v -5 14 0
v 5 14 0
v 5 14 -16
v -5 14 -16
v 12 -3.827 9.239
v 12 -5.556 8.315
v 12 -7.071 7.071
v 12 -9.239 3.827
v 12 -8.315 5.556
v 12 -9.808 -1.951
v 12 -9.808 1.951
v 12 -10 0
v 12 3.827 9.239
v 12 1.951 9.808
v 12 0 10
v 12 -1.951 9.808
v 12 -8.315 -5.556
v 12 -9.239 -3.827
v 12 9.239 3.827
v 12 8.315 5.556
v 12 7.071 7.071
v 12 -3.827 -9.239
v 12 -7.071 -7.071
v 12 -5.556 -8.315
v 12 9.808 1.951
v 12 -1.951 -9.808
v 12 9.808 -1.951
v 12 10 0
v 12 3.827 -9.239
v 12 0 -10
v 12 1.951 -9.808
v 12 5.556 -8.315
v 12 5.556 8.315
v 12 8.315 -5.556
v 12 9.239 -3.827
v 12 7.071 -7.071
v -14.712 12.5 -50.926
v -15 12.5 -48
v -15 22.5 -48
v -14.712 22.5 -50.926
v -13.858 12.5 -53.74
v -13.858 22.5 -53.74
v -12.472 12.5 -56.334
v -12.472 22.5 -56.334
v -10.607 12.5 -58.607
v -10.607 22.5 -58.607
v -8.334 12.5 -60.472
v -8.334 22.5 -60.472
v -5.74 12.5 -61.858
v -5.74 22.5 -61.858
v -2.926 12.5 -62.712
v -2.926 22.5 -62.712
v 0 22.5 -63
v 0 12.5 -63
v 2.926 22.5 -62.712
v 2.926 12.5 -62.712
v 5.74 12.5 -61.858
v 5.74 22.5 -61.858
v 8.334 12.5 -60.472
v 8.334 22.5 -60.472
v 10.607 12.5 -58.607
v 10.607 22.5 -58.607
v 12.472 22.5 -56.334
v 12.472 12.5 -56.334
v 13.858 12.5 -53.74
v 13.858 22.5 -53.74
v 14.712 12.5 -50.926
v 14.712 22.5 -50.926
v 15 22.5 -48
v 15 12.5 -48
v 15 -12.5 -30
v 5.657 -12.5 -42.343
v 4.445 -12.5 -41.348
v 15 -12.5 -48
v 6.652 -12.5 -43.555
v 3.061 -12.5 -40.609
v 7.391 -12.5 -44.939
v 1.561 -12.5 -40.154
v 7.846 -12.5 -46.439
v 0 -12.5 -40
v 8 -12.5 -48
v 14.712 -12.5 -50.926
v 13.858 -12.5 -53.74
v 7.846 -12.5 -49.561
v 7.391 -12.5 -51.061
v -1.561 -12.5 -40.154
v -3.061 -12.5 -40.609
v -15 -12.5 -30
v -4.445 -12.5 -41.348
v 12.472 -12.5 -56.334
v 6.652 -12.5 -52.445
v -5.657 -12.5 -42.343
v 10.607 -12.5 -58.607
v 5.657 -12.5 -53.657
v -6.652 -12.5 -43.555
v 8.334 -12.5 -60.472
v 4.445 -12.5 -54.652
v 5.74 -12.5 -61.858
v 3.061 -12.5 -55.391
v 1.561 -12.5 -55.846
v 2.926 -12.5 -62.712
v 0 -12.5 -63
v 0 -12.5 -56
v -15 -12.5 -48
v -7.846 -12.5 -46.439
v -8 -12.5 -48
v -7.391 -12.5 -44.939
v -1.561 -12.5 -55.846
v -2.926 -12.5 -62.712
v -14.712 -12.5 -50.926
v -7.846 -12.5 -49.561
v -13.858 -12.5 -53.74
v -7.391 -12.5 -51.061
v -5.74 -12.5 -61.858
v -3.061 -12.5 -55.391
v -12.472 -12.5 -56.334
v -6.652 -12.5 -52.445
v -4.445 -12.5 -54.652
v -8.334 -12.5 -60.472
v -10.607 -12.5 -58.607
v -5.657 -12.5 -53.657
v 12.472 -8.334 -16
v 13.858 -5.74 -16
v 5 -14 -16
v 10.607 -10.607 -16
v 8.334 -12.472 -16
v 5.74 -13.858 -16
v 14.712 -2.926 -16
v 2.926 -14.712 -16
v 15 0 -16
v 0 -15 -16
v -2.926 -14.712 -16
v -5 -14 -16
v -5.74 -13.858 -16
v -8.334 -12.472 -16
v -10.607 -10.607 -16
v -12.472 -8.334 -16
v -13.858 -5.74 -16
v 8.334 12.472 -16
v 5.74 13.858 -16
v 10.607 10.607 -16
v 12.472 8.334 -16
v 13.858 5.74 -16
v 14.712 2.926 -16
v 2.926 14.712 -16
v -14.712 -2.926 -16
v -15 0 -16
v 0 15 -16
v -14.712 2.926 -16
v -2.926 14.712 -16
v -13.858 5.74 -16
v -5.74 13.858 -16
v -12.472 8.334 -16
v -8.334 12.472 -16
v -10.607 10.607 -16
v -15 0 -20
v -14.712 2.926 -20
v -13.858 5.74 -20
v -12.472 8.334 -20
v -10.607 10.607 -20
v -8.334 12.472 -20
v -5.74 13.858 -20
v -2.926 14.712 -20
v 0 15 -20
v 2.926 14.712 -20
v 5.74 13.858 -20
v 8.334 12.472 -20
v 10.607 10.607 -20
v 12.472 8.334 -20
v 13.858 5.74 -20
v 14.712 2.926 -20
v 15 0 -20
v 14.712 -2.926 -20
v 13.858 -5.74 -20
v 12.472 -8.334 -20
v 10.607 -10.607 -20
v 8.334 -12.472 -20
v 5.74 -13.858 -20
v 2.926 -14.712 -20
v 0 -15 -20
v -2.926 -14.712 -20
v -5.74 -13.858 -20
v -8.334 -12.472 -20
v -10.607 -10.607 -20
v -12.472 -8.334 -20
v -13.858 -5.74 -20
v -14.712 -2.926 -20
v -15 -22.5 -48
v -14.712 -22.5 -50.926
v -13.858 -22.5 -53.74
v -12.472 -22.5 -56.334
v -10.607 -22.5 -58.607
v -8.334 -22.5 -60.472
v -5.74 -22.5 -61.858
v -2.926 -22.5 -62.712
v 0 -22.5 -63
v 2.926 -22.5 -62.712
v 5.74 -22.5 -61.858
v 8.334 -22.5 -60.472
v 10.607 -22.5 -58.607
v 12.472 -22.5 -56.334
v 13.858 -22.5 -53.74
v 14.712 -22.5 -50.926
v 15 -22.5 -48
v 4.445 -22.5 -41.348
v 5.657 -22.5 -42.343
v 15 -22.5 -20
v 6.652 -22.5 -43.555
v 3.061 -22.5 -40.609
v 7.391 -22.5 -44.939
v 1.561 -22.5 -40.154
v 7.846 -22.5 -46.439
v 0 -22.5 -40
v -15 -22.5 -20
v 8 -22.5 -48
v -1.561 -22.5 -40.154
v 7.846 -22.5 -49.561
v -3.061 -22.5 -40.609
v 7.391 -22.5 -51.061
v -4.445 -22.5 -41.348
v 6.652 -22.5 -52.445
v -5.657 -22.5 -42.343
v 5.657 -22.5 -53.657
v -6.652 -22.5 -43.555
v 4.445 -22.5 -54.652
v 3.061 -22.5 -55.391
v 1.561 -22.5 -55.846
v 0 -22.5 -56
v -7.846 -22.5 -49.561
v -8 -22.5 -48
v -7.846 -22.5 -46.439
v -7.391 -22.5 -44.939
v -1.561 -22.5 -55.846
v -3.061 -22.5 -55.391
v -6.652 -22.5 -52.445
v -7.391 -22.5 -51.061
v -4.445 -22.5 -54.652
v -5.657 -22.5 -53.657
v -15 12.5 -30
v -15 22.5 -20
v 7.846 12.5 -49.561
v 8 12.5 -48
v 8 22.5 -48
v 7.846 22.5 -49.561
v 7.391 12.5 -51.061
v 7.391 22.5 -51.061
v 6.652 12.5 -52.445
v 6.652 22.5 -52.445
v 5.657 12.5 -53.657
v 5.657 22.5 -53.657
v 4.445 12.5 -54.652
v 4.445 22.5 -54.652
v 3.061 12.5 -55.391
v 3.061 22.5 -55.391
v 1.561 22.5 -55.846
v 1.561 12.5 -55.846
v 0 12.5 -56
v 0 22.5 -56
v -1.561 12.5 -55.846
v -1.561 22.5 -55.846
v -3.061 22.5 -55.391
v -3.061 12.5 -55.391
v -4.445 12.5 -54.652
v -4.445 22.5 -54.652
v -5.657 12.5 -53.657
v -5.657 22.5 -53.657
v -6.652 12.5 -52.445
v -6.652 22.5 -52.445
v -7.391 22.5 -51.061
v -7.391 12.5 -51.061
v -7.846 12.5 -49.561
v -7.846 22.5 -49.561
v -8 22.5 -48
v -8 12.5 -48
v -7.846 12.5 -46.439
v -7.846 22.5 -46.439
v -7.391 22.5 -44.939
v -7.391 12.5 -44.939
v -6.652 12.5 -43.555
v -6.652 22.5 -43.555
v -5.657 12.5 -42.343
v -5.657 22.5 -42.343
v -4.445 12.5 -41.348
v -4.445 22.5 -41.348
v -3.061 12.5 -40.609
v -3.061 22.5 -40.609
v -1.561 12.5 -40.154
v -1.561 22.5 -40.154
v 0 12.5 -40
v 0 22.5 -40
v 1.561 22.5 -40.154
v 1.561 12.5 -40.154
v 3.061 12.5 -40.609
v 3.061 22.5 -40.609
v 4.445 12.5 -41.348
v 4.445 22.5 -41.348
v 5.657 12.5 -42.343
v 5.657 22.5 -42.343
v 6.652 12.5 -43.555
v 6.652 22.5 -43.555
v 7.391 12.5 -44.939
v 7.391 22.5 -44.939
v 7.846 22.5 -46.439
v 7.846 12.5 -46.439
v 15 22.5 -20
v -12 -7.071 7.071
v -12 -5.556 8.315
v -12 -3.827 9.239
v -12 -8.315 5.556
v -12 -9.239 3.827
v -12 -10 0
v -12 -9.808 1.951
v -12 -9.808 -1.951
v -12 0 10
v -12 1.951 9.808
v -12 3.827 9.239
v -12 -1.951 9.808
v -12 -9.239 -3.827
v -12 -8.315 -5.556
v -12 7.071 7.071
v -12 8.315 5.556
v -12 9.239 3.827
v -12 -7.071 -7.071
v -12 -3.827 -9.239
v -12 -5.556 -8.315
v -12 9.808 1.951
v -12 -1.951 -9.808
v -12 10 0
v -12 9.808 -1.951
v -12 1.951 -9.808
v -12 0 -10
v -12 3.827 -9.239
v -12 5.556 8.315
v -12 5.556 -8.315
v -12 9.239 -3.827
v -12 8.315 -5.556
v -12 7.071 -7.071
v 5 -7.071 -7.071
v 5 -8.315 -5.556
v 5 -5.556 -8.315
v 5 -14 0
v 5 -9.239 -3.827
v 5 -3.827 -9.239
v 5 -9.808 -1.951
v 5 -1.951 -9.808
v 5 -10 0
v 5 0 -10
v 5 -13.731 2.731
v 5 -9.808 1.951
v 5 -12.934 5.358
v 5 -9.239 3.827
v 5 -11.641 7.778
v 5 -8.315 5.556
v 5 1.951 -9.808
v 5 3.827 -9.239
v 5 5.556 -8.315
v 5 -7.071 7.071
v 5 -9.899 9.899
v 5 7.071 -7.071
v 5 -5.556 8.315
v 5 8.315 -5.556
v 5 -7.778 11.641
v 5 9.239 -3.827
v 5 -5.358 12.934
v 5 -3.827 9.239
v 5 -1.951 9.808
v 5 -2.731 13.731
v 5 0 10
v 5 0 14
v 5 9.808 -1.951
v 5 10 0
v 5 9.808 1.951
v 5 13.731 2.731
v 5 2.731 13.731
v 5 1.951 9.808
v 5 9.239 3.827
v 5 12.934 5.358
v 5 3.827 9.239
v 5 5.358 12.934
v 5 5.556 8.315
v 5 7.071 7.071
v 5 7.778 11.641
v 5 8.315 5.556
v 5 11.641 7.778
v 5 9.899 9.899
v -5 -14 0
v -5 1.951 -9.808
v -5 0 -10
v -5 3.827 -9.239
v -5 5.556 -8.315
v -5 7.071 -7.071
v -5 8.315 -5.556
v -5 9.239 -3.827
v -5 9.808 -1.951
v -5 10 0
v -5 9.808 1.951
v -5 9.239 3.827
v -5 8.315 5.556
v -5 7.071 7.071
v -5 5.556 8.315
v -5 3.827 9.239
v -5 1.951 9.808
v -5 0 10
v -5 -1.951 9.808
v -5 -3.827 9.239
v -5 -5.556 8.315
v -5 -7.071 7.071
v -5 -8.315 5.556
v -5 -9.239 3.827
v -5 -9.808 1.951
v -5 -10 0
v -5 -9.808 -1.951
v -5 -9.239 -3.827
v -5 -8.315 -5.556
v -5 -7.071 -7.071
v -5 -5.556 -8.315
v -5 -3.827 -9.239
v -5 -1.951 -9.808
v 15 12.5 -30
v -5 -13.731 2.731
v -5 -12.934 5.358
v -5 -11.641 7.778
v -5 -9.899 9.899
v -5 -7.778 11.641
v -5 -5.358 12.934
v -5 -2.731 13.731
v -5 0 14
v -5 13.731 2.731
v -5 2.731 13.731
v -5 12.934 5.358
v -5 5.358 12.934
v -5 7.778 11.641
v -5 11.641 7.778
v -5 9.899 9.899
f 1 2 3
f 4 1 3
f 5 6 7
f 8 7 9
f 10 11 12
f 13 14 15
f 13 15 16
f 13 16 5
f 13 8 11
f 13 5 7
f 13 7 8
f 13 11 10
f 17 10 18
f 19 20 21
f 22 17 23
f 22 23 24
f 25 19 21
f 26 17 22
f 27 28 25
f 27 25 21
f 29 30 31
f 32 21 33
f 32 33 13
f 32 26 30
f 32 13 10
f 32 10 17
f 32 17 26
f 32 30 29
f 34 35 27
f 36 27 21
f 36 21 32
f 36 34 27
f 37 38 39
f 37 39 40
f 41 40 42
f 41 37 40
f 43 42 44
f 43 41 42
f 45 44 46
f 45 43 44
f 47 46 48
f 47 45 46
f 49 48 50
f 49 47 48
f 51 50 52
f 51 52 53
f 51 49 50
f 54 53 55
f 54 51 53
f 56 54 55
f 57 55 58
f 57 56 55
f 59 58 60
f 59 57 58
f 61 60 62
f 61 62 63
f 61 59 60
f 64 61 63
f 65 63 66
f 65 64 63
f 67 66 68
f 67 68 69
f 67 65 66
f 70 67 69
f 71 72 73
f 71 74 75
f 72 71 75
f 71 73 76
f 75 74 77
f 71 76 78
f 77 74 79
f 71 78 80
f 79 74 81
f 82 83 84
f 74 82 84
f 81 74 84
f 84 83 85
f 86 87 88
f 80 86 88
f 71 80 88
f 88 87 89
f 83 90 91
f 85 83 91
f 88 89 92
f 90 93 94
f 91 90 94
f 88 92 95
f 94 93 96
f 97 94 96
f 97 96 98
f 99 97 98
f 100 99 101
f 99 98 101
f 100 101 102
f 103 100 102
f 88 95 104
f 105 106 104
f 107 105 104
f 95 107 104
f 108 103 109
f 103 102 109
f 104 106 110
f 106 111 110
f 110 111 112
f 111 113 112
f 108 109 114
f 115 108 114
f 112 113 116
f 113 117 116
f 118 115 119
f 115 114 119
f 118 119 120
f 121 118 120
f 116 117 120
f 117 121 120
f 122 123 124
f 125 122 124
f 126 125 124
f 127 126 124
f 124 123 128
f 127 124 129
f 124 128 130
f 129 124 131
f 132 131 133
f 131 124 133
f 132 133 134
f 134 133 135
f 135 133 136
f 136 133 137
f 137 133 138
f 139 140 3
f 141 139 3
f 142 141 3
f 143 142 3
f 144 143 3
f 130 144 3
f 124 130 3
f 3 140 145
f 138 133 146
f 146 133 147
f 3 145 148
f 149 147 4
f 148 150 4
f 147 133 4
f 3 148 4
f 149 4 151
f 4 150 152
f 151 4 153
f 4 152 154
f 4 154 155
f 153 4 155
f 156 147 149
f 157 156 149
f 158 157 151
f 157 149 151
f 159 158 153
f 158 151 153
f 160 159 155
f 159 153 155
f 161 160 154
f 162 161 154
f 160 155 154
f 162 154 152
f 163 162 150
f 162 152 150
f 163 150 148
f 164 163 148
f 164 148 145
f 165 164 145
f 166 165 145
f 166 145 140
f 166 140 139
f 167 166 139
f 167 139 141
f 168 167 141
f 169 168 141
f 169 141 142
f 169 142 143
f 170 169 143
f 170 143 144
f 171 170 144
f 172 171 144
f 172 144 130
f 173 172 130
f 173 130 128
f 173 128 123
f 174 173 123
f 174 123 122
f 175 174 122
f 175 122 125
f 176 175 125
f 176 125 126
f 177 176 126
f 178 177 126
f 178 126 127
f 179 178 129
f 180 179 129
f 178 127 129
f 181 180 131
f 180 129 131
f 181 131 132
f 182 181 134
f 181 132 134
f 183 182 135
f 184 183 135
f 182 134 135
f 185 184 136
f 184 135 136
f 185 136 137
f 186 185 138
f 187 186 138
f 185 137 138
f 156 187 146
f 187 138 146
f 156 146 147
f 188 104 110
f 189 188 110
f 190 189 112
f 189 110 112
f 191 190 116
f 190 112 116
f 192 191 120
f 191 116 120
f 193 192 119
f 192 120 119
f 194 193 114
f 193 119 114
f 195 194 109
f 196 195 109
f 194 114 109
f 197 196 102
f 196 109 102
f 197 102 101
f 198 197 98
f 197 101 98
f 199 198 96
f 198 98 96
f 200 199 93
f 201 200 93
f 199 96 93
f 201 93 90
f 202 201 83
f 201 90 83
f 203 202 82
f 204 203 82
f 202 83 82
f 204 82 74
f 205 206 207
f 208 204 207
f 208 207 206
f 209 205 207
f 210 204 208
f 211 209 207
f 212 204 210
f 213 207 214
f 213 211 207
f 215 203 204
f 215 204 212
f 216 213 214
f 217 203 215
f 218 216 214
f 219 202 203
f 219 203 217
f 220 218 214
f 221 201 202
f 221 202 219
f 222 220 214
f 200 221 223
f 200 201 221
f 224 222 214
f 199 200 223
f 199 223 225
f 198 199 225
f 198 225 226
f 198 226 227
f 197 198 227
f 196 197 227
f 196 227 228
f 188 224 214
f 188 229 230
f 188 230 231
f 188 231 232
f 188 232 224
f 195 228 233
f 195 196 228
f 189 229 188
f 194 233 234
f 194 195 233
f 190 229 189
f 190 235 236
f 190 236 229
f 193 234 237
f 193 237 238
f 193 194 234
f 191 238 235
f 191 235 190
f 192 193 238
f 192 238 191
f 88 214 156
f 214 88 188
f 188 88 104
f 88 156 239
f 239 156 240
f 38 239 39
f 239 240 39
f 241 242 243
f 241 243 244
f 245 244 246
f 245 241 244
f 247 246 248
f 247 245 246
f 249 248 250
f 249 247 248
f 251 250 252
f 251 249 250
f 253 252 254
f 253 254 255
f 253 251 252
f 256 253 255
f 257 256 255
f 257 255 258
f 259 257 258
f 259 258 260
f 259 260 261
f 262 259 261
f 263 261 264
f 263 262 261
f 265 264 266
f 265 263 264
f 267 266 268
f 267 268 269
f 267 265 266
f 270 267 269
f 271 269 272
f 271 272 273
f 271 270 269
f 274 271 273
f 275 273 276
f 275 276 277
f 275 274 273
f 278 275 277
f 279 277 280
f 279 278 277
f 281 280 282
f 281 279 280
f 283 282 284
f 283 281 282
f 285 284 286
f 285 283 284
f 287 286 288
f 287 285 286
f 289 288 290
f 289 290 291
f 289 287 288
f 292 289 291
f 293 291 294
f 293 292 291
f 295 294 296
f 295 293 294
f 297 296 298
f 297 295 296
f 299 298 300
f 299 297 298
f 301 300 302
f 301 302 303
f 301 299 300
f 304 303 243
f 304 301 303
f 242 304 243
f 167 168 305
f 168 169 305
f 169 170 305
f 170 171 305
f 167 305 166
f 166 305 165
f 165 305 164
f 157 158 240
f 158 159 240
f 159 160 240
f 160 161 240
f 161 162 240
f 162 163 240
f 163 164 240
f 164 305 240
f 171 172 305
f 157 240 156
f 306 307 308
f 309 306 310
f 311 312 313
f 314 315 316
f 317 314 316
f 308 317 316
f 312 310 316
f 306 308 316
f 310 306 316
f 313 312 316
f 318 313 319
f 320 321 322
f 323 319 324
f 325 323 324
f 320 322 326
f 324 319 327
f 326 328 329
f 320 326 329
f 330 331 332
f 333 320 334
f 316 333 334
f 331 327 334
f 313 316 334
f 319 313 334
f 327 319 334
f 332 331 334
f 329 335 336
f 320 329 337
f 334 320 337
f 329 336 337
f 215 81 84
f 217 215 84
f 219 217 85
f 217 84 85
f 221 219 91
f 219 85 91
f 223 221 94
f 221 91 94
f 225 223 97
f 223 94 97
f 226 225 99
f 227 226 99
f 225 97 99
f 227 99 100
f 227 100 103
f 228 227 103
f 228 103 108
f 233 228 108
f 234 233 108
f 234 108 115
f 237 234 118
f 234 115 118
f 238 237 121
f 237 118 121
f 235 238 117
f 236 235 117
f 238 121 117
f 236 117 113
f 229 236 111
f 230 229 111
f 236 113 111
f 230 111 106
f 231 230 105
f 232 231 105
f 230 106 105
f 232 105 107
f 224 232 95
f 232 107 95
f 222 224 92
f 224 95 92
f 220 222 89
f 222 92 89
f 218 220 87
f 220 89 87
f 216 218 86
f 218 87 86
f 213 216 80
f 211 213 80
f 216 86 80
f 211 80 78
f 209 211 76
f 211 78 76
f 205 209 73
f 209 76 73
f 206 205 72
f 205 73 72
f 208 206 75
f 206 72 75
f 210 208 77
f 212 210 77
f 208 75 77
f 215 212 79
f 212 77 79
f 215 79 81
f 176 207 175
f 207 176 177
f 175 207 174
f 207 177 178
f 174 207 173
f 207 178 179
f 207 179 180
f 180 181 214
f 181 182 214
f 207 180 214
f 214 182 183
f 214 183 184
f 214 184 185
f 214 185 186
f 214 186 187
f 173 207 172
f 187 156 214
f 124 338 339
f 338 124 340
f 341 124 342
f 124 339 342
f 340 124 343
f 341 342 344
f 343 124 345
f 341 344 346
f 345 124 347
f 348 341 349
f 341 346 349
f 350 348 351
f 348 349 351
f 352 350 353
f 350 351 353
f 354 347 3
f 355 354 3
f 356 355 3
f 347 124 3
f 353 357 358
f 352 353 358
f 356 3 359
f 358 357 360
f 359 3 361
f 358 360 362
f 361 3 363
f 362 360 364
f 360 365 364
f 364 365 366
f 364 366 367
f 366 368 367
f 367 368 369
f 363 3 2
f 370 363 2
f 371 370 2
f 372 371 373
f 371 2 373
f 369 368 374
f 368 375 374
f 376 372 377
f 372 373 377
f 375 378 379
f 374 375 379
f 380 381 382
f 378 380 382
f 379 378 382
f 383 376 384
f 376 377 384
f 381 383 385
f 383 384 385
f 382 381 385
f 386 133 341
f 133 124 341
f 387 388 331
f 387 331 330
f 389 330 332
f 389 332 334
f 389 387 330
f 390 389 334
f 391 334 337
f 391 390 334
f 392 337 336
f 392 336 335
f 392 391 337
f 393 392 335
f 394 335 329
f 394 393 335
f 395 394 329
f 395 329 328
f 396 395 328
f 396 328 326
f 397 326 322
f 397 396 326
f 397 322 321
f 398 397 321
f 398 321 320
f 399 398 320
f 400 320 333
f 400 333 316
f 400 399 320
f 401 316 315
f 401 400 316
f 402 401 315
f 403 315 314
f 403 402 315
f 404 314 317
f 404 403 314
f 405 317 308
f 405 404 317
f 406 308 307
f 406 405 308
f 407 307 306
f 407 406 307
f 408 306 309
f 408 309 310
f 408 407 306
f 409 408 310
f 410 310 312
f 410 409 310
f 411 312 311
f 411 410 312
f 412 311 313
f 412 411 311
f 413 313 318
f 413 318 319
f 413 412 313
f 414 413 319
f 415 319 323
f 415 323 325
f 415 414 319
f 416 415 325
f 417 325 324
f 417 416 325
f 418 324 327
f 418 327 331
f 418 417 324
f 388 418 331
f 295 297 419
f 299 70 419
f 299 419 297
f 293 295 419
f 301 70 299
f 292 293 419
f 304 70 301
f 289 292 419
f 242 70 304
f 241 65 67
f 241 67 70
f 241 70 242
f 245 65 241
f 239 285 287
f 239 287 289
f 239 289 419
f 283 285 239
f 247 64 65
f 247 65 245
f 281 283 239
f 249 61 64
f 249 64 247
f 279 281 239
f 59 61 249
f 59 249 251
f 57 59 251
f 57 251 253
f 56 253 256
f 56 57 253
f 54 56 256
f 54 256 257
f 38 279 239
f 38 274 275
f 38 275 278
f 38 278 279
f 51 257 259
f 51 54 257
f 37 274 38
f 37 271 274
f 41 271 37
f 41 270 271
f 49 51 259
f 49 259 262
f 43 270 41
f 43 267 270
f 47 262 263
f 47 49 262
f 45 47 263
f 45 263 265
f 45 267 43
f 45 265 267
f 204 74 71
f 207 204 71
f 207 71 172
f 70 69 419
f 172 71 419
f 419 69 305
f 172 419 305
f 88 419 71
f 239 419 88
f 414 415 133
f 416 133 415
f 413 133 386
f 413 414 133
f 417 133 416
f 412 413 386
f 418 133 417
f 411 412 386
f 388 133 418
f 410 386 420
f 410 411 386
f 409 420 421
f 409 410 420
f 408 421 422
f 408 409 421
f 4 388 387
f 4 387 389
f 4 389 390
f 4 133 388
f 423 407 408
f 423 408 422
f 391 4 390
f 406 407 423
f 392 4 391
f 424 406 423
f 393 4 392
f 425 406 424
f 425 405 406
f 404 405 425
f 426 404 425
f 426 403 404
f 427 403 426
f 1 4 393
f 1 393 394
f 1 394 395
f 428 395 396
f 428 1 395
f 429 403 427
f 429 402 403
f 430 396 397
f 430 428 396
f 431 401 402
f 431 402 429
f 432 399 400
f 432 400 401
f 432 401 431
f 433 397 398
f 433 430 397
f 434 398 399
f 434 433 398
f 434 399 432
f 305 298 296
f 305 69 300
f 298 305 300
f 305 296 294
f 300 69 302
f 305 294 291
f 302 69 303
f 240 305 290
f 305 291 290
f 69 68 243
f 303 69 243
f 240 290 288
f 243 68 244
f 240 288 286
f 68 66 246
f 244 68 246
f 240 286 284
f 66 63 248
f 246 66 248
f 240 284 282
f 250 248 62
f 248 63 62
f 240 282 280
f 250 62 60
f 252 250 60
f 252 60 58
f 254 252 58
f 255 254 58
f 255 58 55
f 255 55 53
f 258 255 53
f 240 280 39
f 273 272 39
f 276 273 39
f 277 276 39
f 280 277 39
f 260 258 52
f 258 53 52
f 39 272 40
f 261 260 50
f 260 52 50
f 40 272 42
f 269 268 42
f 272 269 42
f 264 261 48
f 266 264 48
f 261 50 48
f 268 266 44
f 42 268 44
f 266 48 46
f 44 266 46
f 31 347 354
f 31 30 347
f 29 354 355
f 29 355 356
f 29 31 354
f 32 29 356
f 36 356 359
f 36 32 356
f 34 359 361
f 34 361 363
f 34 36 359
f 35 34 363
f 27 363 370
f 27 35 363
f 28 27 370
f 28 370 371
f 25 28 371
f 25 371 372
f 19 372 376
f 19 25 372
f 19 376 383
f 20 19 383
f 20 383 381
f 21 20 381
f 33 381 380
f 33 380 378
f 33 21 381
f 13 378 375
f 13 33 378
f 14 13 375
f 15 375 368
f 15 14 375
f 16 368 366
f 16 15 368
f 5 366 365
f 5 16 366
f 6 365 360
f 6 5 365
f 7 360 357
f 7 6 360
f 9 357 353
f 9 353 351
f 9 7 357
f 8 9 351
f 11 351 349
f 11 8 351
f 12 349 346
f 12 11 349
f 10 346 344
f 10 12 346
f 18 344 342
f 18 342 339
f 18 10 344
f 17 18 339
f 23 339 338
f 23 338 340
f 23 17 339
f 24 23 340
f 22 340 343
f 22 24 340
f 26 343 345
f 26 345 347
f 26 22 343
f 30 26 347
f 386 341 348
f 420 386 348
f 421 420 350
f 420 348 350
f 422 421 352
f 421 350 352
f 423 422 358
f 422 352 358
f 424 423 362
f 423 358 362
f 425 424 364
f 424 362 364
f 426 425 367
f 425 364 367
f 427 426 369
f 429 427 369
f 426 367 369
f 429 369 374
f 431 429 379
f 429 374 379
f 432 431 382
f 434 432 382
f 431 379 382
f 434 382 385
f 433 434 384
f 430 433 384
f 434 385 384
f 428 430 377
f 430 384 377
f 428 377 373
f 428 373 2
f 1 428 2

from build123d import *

# Parameters (mm, degrees)
SKETCH1_R           = 10
BOSS_EXTRUDE1_DEPTH = 12
BOSS_EXTRUDE2_DEPTH = 5
SKETCH3_R           = 15
BOSS_EXTRUDE3_DEPTH = 4
SKETCH5_W           = 30
SKETCH5_H           = 45
BOSS_EXTRUDE4_DEPTH = 10
BOSS_EXTRUDE5_START = 12.5
SKETCH7_R           = 8
BOSS_EXTRUDE5_DEPTH = 10
BOSS_EXTRUDE6_START = -12.5
SKETCH7_2_R         = 8
BOSS_EXTRUDE6_DEPTH = 10


with BuildPart() as part:
    # Sketch1 → Boss-Extrude1 (new body, symmetric)
    with BuildSketch(Plane(origin=(0, 0, 0), x_dir=(0, 0, -1), z_dir=(1, 0, 0))):
        Circle(SKETCH1_R)
    extrude(amount=BOSS_EXTRUDE1_DEPTH, both=True)

    # Sketch2 → Boss-Extrude2 (add, symmetric)
    with BuildSketch(Plane(origin=(0, 0, 0), x_dir=(0, 0, -1), z_dir=(1, 0, 0))):
        with BuildLine():
            Line((0, 14), (16, 14))
            Line((16, 14), (16, -14))
            Line((16, -14), (0, -14))
            ThreePointArc((0, -14), (-14, 0), (0, 14))
        make_face()
    extrude(amount=BOSS_EXTRUDE2_DEPTH, both=True)

    # Sketch3 → Boss-Extrude3 (add)
    with BuildSketch(Plane(origin=(0, 0, -16), x_dir=(-1, 0, 0), z_dir=(0, 0, -1))):
        Circle(SKETCH3_R)
    extrude(amount=BOSS_EXTRUDE3_DEPTH)

    # Sketch5 → Boss-Extrude4 (add)
    with BuildSketch(Plane(origin=(0, 0, -20), x_dir=(-1, 0, 0), z_dir=(0, 0, -1))):
        Rectangle(SKETCH5_W, SKETCH5_H)
    extrude(amount=BOSS_EXTRUDE4_DEPTH)

    # Sketch7 → Boss-Extrude5 (add)
    with BuildSketch(Plane(origin=(0, 0, 0), x_dir=(1, 0, 0), z_dir=(0, 1, 0)).offset(BOSS_EXTRUDE5_START)):
        with BuildLine():
            Line((-15, 30), (-15, 48))
            ThreePointArc((-15, 48), (0, 63), (15, 48))
            Line((15, 48), (15, 30))
            Line((15, 30), (-15, 30))
        make_face()
        with Locations((0, 48)):
            Circle(SKETCH7_R, mode=Mode.SUBTRACT)
    extrude(amount=BOSS_EXTRUDE5_DEPTH)

    # Sketch7<2> → Boss-Extrude6 (add)
    with BuildSketch(Plane(origin=(0, 0, 0), x_dir=(1, 0, 0), z_dir=(0, 1, 0)).offset(BOSS_EXTRUDE6_START)):
        with BuildLine():
            Line((-15, 30), (-15, 48))
            ThreePointArc((-15, 48), (0, 63), (15, 48))
            Line((15, 48), (15, 30))
            Line((15, 30), (-15, 30))
        make_face()
        with Locations((0, 48)):
            Circle(SKETCH7_2_R, mode=Mode.SUBTRACT)
    extrude(amount=-BOSS_EXTRUDE6_DEPTH)


solid = part.part
